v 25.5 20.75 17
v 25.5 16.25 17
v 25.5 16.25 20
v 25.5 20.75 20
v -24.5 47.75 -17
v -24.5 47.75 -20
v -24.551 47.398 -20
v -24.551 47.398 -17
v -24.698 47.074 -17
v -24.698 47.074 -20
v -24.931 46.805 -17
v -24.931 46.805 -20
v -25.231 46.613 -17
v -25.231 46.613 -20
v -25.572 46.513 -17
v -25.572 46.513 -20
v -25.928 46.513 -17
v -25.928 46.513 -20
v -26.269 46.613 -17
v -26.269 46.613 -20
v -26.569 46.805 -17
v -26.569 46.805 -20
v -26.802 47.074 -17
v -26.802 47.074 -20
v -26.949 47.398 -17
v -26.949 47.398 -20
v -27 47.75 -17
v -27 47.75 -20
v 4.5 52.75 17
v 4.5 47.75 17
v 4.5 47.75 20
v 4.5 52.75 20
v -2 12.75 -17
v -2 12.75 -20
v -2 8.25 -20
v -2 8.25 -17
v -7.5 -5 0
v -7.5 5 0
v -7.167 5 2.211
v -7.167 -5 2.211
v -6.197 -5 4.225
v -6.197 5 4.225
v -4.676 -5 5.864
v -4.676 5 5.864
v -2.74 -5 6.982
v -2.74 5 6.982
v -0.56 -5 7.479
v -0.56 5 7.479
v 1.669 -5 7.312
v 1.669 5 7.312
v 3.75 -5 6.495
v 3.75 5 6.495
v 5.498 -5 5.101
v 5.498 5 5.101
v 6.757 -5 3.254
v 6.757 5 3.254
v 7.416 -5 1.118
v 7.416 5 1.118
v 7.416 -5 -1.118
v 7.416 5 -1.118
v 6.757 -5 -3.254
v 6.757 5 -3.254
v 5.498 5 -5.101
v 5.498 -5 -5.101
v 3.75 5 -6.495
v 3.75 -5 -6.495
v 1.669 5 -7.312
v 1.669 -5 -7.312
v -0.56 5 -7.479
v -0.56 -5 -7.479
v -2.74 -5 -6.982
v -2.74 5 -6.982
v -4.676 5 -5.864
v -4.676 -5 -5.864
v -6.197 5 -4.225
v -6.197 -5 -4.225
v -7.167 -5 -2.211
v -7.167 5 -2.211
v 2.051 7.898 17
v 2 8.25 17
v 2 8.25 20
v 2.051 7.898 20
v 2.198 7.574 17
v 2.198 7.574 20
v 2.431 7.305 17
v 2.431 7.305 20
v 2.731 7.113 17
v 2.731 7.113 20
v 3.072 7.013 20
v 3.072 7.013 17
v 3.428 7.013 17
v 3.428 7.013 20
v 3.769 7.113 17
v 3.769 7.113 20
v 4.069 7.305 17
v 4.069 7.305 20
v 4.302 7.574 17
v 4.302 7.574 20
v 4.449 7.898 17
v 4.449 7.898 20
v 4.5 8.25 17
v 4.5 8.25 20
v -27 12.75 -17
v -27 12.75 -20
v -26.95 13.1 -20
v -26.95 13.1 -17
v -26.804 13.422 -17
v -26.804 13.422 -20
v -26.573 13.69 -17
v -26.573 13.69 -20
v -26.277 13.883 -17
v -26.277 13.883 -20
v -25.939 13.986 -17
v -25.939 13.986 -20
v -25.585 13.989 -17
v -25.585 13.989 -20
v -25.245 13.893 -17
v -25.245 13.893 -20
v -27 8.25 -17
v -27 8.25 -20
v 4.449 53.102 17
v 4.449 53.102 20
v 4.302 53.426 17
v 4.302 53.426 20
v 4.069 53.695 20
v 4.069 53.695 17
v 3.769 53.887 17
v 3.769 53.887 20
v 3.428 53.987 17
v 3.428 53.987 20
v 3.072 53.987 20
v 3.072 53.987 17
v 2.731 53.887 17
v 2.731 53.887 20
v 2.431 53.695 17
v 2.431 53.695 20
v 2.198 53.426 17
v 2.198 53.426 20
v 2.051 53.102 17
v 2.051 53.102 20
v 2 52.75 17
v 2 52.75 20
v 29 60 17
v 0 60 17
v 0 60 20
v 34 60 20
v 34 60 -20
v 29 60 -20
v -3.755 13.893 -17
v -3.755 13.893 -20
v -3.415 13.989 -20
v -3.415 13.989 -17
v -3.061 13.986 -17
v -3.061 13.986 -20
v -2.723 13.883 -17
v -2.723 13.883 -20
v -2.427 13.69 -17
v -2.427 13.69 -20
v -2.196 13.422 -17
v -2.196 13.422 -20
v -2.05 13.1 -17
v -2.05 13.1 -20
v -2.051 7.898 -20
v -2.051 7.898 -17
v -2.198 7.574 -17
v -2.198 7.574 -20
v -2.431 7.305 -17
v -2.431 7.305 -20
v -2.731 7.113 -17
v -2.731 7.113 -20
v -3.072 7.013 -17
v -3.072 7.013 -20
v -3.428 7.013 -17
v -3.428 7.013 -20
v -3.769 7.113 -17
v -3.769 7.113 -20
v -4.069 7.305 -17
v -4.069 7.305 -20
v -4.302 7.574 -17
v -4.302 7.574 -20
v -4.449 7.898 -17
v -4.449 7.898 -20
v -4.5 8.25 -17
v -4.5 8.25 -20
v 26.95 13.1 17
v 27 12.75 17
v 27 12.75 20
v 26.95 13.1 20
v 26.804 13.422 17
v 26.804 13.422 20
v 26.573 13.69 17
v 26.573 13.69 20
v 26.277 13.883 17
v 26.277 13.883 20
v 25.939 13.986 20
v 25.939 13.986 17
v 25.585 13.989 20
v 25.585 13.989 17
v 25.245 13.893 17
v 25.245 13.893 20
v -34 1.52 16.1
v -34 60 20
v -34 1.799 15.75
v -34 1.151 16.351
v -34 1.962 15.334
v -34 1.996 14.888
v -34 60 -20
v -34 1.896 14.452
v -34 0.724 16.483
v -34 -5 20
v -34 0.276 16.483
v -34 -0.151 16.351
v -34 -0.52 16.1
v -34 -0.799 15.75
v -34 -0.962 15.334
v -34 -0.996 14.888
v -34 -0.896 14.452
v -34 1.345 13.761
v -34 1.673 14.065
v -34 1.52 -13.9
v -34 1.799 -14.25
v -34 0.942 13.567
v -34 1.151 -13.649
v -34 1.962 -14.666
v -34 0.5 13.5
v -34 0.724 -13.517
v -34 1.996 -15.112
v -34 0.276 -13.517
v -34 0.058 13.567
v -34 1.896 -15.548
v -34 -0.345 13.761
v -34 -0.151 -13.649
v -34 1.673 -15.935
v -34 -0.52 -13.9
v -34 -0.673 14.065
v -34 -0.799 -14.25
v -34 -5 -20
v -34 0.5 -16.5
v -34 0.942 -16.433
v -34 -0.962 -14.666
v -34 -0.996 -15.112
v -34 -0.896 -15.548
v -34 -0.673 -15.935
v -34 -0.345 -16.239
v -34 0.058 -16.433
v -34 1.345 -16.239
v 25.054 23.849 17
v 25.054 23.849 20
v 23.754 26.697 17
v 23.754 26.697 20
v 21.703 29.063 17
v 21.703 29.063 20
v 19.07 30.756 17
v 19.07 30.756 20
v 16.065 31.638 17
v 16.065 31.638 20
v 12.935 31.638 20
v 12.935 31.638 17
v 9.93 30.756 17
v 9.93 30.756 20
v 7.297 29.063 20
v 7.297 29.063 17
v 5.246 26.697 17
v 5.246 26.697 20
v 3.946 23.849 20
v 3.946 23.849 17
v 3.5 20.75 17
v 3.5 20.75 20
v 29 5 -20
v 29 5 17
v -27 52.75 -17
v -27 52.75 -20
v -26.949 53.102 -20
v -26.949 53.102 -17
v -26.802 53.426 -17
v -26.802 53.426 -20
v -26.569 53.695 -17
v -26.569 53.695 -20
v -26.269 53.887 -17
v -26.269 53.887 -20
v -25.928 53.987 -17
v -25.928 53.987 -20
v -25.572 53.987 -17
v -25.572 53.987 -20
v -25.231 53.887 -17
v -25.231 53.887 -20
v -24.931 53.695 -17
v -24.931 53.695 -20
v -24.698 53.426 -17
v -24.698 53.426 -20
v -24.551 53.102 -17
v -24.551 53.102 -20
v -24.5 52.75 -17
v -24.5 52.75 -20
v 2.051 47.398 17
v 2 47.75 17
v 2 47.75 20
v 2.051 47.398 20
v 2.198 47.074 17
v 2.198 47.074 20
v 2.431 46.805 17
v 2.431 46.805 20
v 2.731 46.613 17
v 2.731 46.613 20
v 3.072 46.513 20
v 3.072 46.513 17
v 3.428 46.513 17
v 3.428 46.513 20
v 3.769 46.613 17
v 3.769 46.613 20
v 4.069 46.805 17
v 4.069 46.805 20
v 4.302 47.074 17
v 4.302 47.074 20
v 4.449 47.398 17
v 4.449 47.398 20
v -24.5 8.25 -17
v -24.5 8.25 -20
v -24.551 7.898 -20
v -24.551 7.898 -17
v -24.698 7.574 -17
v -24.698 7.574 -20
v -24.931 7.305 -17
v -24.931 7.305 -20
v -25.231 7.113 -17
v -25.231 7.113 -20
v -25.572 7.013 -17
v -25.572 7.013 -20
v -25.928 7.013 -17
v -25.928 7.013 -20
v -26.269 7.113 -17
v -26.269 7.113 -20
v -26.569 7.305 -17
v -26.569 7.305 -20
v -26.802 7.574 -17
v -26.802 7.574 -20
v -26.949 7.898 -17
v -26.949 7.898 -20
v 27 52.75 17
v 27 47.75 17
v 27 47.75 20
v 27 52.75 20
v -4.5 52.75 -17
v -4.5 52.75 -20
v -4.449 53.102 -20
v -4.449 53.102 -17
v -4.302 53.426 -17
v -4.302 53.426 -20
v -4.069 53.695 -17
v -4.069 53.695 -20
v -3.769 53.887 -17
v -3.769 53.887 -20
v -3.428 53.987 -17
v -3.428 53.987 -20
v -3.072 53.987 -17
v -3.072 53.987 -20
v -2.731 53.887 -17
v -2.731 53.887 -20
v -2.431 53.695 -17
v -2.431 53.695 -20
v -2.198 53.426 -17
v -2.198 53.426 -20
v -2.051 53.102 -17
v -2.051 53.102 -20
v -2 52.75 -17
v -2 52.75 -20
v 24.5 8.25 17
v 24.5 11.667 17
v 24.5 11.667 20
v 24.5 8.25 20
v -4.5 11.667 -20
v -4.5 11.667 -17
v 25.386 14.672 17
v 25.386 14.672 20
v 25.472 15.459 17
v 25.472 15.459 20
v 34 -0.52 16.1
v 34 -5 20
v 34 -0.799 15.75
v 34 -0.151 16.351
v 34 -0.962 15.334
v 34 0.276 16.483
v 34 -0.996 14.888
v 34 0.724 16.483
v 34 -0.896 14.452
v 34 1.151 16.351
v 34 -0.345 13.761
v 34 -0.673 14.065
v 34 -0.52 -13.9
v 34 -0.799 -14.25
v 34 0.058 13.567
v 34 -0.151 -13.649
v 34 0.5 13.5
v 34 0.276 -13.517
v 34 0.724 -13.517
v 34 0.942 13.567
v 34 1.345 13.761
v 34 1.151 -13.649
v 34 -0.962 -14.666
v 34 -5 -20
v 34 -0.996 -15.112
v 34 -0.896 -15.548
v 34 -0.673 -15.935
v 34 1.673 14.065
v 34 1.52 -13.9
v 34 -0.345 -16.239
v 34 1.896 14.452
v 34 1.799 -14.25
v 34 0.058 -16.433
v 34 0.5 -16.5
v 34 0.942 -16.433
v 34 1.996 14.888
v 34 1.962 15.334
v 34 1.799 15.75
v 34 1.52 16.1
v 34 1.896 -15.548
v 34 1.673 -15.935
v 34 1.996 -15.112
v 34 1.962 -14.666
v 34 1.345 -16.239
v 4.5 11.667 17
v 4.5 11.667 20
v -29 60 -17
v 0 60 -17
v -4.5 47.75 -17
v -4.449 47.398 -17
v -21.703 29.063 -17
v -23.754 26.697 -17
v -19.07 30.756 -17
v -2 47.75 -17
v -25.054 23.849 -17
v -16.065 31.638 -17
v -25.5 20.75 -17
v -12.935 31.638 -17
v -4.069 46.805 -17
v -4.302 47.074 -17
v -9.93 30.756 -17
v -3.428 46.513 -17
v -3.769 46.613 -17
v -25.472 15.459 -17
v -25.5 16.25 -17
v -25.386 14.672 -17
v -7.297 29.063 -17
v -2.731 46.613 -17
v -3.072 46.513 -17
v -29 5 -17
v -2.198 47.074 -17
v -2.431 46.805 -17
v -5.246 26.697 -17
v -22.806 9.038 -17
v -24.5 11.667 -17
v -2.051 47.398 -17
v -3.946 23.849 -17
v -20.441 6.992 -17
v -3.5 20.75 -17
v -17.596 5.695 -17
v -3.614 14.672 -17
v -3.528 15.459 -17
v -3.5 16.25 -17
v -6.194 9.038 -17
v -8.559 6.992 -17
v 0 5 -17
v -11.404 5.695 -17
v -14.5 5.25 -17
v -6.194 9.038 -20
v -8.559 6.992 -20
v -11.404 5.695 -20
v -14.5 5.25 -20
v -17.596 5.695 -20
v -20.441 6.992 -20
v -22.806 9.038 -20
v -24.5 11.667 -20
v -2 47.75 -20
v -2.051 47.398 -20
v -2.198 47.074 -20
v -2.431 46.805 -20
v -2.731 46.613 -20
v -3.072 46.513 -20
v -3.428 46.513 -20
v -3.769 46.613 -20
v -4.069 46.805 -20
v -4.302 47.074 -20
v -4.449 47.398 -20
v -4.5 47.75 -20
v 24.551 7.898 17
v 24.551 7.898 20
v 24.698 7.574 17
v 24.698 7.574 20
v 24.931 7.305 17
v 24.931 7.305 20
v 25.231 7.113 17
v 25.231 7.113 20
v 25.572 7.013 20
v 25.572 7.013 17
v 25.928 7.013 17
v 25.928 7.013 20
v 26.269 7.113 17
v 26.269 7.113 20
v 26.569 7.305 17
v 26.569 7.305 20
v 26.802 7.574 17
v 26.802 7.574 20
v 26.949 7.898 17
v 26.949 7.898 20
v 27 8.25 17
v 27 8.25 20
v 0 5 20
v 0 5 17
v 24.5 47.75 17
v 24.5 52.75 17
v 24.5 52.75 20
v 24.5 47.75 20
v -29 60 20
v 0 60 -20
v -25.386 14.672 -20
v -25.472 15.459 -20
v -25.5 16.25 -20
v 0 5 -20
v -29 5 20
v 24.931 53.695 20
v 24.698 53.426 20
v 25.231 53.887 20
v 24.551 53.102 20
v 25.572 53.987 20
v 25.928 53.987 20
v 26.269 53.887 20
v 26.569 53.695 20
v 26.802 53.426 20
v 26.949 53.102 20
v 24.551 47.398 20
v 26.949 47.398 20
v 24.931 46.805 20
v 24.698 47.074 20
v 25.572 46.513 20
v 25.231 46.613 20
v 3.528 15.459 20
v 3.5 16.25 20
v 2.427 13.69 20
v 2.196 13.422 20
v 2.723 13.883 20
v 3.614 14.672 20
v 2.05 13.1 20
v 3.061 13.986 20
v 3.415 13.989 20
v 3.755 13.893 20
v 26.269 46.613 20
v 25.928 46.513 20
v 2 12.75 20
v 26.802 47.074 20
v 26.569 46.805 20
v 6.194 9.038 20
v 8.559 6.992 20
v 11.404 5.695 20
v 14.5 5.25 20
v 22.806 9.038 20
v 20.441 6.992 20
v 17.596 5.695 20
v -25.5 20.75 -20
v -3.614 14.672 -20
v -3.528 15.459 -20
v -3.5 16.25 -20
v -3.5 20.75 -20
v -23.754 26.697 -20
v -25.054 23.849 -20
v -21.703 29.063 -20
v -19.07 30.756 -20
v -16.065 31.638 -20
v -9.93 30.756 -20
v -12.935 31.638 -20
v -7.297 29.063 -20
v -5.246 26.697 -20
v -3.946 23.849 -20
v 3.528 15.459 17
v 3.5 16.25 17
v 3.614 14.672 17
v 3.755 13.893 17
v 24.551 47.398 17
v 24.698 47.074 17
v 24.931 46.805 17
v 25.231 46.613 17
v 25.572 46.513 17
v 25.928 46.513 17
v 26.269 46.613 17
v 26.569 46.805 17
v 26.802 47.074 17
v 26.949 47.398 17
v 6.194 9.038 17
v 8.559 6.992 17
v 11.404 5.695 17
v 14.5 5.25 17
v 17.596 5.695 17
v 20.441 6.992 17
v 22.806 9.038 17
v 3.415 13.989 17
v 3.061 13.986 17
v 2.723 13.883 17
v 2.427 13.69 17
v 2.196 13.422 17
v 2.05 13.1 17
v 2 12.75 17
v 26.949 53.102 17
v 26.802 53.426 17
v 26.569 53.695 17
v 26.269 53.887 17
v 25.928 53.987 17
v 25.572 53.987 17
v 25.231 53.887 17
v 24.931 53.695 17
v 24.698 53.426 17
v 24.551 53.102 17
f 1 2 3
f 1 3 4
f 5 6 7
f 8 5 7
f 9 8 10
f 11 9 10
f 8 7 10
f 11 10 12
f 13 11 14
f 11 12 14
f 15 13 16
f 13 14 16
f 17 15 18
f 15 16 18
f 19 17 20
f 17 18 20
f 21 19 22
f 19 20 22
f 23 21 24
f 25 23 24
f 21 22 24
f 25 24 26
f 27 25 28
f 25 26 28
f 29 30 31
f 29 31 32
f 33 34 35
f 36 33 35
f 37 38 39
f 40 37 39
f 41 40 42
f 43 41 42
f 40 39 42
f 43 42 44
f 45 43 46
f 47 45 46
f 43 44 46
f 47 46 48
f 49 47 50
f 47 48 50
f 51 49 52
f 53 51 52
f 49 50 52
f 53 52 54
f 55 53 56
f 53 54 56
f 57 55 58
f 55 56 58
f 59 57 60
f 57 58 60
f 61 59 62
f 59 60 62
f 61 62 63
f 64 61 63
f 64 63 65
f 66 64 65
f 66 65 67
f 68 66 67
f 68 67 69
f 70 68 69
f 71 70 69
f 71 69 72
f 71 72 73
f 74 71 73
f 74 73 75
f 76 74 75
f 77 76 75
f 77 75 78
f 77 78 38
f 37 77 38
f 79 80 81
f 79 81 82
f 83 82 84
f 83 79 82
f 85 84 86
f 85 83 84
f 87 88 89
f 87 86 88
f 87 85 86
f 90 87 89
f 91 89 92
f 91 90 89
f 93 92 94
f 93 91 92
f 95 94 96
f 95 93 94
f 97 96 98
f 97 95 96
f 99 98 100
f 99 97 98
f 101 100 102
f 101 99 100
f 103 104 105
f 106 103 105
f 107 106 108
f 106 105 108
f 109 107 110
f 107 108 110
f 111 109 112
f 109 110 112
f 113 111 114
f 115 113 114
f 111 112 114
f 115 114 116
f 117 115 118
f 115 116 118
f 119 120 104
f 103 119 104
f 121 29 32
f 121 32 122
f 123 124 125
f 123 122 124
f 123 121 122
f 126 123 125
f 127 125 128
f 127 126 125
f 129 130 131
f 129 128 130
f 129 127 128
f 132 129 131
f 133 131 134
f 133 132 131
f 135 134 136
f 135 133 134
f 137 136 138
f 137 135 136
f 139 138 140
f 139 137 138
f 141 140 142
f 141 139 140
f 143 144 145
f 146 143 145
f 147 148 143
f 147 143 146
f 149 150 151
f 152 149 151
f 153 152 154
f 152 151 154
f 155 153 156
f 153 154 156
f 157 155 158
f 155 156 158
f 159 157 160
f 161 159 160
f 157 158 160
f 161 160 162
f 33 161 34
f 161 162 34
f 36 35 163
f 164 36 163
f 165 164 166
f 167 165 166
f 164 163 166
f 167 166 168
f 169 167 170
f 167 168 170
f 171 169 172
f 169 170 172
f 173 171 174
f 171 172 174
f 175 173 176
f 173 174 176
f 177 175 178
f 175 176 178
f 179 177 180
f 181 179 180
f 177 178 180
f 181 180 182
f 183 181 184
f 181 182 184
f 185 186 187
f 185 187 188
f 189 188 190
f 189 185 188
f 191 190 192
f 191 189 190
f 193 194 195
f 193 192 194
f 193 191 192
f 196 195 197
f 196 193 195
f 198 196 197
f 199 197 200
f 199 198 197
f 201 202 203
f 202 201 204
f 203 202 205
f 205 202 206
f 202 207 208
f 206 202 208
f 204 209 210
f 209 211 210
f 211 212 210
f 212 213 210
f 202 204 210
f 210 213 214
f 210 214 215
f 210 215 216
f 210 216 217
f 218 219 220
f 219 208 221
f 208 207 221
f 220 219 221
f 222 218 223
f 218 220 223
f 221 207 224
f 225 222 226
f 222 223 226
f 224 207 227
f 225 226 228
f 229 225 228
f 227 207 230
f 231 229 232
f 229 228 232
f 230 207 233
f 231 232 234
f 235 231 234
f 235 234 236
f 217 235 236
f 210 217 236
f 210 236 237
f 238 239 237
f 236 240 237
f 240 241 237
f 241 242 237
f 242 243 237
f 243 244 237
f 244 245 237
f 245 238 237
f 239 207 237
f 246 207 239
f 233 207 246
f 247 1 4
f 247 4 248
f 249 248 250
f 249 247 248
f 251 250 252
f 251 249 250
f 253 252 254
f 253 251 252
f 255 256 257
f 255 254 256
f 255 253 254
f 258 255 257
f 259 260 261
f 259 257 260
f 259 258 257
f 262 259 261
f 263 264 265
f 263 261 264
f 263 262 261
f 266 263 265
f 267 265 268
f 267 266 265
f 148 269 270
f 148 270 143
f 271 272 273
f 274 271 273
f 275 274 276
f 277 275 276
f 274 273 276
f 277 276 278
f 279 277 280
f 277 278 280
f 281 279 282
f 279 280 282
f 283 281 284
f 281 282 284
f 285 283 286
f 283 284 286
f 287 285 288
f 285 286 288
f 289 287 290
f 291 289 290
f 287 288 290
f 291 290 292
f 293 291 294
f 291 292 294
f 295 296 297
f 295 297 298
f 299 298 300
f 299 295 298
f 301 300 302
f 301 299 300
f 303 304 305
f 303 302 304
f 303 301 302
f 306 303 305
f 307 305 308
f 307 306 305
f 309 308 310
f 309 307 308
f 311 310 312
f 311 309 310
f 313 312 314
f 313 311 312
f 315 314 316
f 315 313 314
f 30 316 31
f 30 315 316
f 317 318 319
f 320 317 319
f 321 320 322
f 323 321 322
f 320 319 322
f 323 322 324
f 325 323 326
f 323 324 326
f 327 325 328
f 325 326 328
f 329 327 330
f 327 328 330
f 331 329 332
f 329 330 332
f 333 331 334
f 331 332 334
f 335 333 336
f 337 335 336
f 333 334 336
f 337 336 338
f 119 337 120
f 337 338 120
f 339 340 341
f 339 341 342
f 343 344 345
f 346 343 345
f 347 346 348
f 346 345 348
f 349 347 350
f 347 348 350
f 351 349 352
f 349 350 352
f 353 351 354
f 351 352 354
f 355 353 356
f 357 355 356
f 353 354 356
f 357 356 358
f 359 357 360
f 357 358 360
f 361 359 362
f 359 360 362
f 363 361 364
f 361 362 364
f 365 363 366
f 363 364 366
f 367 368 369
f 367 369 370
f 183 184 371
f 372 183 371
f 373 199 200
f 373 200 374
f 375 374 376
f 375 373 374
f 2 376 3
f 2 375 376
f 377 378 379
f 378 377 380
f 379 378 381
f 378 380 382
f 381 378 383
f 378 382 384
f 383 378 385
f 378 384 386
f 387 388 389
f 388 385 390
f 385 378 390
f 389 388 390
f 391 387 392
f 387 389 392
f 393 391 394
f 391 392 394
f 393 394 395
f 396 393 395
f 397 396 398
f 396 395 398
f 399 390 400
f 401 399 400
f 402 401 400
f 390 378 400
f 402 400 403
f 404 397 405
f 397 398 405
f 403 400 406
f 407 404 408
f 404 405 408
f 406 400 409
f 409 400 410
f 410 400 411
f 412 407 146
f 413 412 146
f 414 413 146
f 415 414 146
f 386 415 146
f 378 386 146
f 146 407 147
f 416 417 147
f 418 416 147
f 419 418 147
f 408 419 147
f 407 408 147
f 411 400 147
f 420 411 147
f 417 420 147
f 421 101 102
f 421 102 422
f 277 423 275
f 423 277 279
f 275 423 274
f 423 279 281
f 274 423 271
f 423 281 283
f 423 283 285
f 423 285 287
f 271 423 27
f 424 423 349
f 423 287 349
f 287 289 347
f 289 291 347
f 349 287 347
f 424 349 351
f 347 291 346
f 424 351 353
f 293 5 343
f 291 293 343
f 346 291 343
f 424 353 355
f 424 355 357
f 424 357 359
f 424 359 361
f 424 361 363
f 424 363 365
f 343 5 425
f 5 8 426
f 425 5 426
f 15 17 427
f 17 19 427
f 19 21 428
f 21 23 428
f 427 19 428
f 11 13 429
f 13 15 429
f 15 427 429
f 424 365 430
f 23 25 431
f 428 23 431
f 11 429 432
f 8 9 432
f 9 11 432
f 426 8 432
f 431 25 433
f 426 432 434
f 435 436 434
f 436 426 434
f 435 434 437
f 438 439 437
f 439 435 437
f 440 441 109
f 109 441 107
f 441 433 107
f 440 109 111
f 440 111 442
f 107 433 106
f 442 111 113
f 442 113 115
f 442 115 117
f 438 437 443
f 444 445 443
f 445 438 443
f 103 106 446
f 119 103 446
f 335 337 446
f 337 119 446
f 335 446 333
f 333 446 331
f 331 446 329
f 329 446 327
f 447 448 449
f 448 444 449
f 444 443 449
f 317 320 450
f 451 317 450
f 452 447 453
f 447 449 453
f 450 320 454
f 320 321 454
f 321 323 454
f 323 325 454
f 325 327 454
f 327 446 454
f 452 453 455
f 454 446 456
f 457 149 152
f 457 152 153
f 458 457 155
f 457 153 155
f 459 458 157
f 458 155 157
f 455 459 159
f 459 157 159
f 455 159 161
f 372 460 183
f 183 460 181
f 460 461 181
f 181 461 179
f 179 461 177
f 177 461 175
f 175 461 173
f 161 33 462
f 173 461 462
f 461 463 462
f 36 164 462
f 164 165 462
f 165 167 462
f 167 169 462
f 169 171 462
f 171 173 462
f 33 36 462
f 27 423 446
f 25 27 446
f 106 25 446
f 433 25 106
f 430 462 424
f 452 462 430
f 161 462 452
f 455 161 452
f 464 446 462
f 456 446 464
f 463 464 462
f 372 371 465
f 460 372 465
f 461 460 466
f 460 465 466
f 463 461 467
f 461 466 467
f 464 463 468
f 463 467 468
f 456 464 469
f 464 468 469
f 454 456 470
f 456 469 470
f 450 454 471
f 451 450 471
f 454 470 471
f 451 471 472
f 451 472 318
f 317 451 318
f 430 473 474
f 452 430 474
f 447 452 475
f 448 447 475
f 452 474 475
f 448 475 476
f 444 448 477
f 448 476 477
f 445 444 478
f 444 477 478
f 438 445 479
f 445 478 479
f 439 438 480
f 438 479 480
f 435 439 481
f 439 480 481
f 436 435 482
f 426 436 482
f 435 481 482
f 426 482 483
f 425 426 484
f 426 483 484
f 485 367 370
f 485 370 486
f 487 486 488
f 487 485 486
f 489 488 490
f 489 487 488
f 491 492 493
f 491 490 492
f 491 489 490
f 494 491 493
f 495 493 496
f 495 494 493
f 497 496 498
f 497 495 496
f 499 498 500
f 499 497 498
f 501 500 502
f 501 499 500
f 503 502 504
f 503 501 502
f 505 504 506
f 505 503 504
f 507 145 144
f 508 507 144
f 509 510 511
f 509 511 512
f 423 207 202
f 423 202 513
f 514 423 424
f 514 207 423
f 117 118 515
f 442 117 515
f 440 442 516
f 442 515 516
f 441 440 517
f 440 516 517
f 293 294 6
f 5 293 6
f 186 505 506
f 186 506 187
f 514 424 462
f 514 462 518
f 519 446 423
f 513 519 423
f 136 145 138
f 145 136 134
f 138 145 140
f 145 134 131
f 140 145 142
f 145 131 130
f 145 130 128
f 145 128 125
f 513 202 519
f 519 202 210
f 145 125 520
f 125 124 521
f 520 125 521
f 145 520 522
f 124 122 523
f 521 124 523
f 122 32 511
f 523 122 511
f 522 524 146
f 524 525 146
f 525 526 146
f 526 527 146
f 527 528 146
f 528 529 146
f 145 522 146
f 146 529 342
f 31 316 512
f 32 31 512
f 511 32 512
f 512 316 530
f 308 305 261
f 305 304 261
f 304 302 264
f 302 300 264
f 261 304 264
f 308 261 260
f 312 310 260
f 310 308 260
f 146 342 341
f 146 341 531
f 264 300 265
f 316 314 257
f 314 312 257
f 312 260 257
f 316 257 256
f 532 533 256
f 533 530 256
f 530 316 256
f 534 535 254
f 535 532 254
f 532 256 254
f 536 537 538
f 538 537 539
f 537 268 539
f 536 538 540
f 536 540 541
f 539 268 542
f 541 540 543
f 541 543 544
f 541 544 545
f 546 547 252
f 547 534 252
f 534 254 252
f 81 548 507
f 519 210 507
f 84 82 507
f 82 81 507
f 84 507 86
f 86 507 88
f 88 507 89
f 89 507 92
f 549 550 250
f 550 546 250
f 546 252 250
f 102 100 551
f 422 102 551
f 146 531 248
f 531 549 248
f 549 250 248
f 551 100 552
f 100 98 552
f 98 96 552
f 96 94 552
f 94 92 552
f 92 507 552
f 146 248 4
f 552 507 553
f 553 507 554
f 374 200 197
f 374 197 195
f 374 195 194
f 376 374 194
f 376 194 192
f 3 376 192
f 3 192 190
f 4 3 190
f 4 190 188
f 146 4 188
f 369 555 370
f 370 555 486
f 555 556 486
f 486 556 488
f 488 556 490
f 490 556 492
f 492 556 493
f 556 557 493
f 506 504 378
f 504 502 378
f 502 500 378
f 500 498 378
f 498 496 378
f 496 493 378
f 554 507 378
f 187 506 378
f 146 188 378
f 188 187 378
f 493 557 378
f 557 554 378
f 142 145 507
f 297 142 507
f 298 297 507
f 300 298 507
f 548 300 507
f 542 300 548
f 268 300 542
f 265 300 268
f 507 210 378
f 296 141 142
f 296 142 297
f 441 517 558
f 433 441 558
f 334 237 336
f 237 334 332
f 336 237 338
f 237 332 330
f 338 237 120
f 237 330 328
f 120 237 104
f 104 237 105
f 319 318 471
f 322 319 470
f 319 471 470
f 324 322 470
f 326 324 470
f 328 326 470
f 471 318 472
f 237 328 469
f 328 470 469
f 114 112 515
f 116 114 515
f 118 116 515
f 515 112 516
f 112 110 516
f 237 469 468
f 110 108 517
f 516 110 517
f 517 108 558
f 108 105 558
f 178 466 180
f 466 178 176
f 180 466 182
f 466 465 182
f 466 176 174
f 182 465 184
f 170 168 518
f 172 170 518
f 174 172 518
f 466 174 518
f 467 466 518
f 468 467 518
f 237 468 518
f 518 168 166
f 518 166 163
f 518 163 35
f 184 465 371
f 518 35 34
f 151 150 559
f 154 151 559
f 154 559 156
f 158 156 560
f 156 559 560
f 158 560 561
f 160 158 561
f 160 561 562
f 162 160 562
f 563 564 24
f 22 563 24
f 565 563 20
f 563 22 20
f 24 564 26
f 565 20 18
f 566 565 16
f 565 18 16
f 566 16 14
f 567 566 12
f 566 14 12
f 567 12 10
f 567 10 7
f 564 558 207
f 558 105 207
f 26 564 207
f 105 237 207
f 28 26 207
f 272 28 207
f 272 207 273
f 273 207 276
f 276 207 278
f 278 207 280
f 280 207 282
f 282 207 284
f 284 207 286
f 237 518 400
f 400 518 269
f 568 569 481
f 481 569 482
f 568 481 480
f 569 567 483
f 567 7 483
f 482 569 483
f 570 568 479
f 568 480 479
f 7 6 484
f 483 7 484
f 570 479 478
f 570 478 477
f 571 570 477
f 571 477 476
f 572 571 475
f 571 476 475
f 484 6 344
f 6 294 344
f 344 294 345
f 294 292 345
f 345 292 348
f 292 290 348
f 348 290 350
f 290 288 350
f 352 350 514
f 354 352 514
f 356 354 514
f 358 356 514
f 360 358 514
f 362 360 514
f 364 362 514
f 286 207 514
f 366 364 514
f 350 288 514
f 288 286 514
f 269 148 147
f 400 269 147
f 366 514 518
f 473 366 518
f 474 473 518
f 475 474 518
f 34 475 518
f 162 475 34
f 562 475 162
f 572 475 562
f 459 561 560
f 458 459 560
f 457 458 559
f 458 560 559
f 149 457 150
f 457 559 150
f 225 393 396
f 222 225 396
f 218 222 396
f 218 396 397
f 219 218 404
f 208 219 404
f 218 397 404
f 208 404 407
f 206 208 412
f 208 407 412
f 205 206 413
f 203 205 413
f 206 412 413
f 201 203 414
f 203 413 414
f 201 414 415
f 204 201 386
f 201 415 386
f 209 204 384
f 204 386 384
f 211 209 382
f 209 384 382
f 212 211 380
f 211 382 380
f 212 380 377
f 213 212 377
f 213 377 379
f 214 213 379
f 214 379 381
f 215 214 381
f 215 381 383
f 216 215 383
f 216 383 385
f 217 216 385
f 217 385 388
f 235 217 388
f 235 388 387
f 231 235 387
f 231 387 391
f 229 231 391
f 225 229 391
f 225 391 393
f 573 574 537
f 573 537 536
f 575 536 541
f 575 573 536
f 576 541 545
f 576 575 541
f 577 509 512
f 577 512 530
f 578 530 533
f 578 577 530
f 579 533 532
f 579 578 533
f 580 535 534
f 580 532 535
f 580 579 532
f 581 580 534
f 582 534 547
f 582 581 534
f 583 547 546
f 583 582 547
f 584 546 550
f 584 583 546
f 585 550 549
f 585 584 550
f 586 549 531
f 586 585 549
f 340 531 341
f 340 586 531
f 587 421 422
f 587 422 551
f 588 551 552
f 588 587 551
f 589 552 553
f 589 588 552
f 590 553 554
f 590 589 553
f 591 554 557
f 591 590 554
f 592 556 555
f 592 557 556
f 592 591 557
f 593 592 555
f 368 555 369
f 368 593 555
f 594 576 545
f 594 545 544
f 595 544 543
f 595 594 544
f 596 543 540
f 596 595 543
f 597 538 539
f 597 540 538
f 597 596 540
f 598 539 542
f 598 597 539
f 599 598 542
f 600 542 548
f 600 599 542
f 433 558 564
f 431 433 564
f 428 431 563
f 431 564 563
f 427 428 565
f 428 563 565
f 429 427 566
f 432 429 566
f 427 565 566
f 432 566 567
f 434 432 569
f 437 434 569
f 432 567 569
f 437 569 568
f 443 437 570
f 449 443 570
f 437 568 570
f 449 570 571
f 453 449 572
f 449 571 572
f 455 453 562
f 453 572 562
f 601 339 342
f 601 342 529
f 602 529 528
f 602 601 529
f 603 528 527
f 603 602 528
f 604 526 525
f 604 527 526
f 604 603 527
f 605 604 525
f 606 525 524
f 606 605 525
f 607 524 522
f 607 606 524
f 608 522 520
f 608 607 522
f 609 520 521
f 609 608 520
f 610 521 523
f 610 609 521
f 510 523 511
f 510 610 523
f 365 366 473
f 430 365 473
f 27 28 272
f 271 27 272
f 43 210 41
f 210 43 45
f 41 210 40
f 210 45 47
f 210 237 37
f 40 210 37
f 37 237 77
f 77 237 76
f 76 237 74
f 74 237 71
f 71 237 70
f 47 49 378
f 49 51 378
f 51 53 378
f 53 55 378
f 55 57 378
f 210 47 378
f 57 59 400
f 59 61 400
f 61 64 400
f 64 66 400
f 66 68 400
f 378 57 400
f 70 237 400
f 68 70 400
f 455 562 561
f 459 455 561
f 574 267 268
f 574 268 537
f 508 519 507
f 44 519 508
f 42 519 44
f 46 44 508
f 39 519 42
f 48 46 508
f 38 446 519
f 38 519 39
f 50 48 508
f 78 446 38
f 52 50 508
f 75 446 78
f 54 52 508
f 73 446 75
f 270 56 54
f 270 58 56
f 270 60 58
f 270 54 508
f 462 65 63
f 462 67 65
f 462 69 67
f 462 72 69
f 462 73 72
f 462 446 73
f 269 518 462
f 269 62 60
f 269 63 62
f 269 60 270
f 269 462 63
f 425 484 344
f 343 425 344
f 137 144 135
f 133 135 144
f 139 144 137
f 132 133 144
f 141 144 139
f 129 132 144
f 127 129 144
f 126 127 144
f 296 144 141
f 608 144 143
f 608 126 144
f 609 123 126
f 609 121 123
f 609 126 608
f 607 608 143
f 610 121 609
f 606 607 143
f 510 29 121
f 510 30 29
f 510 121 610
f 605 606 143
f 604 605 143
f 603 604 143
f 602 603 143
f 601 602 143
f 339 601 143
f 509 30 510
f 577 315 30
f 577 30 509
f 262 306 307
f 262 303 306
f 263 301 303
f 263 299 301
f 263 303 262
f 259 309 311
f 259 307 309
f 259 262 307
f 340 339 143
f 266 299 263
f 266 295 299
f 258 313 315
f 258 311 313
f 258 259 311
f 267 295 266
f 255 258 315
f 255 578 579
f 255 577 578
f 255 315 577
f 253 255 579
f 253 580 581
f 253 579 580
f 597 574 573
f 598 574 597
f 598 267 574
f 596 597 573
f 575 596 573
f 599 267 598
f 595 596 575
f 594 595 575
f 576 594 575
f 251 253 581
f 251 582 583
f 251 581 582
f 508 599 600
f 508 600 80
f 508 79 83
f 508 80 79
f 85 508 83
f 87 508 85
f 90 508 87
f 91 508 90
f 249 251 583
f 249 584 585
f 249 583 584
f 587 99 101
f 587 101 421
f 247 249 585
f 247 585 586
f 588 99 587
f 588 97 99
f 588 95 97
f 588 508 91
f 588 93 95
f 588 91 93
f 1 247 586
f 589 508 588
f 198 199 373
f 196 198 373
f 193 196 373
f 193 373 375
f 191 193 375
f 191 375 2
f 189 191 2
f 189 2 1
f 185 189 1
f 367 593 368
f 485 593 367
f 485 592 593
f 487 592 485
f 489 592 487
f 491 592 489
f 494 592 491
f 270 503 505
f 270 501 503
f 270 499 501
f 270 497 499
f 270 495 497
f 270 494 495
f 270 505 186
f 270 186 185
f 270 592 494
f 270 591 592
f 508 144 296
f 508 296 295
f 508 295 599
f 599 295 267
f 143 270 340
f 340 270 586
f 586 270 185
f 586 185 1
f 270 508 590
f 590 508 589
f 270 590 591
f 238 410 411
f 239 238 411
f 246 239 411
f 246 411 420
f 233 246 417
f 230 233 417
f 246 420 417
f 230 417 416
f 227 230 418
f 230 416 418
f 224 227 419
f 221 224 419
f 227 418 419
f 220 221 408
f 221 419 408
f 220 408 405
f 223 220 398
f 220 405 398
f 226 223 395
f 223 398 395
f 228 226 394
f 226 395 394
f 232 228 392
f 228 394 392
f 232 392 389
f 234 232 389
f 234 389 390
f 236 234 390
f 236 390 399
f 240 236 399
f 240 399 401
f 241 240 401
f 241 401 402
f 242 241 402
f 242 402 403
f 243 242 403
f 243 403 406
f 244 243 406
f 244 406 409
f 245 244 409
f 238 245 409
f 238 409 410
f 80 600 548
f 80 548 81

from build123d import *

# Parameters (mm, degrees)
BOSS_EXTRUDE1_DEPTH      = 20
BOSS_EXTRUDE1_DEPTH_BACK = 20
SKETCH2_W                = 29
SKETCH2_H                = 3
BOSS_EXTRUDE2_DEPTH      = 55
SKETCH4_R                = 7.5
CUT_EXTRUDE2_DEPTH       = 12
SKETCH5_R                = 1.5
CUT_EXTRUDE3_DEPTH       = 93.86549413
CUT_EXTRUDE1_DEPTH       = 63


with BuildPart() as part:
    # Sketch1 → Boss-Extrude1 (new, two sides: drawn at the far end of the back side and taken through both)
    with BuildSketch(Plane.XY.offset(-BOSS_EXTRUDE1_DEPTH_BACK)):
        Polygon((-34, -5), (34, -5), (34, 60), (29, 60), (29, 5), (-29, 5), (-29, 60), (-34, 60), align=None)
    extrude(amount=BOSS_EXTRUDE1_DEPTH + BOSS_EXTRUDE1_DEPTH_BACK)

    # Sketch2 → Boss-Extrude2 (add)
    with BuildSketch(Plane(origin=(0, 5, 0), x_dir=(1, 0, 0), z_dir=(0, 1, 0))):
        with Locations((14.5, -18.5)):
            Rectangle(SKETCH2_W, SKETCH2_H)
        with Locations((-14.5, 18.5)):
            Rectangle(SKETCH2_W, SKETCH2_H)
    extrude(amount=BOSS_EXTRUDE2_DEPTH)

    # Sketch4 → Cut-Extrude2 (cut)
    with BuildSketch(Plane(origin=(0, 5, 0), x_dir=(1, 0, 0), z_dir=(0, 1, 0))):
        Circle(SKETCH4_R)
    extrude(amount=-CUT_EXTRUDE2_DEPTH, mode=Mode.SUBTRACT)

    # Sketch5 → Cut-Extrude3 (cut, through all)
    with BuildSketch(Plane(origin=(34, 0, 0), x_dir=(0, 0, -1), z_dir=(1, 0, 0))):
        with Locations((-15, 0.5)):
            Circle(SKETCH5_R)
        with Locations((15, 0.5)):
            Circle(SKETCH5_R)
    extrude(amount=-CUT_EXTRUDE3_DEPTH, mode=Mode.SUBTRACT)

    # Sketch3 → Cut-Extrude1 (cut)
    with BuildSketch(Plane(origin=(0, 0, -20), x_dir=(-1, 0, 0), z_dir=(0, 0, -1))):
        with BuildLine():
            ThreePointArc((3.755430717, 13.893258409), (2.567830079, 13.797446513), (2, 12.75))
            Line((2, 12.75), (2, 8.25))
            ThreePointArc((2, 8.25), (3.25, 7), (4.5, 8.25))
            Line((4.5, 8.25), (4.5, 11.667424305))
            ThreePointArc((4.5, 11.667424305), (14.5, 5.25), (24.5, 11.667424305))
            Line((24.5, 11.667424305), (24.5, 8.25))
            ThreePointArc((24.5, 8.25), (25.75, 7), (27, 8.25))
            Line((27, 8.25), (27, 12.75))
            ThreePointArc((27, 12.75), (26.432169921, 13.797446513), (25.244569283, 13.893258409))
            ThreePointArc((25.244569283, 13.893258409), (25.435955882, 15.064728325), (25.5, 16.25))
            Line((25.5, 16.25), (25.5, 20.75))
            ThreePointArc((25.5, 20.75), (14.5, 31.75), (3.5, 20.75))
            Line((3.5, 20.75), (3.5, 16.25))
            ThreePointArc((3.5, 16.25), (3.564044118, 15.064728325), (3.755430717, 13.893258409))
        make_face()
        with BuildLine():
            ThreePointArc((4.5, 52.75), (3.25, 54), (2, 52.75))
            Line((2, 52.75), (2, 47.75))
            ThreePointArc((2, 47.75), (3.25, 46.5), (4.5, 47.75))
            Line((4.5, 47.75), (4.5, 52.75))
        make_face()
        with BuildLine():
            ThreePointArc((27, 52.75), (25.75, 54), (24.5, 52.75))
            Line((24.5, 52.75), (24.5, 47.75))
            ThreePointArc((24.5, 47.75), (25.75, 46.5), (27, 47.75))
            Line((27, 47.75), (27, 52.75))
        make_face()
    cut_extrude1 = extrude(amount=-CUT_EXTRUDE1_DEPTH, mode=Mode.SUBTRACT)

    # Mirror4: Cut-Extrude1 across plane
    add(cut_extrude1.mirror(Plane(origin=(0, 0, 0), x_dir=(0, 0, 1), z_dir=(1, 0, 0))), mode=Mode.SUBTRACT)


solid = part.part
